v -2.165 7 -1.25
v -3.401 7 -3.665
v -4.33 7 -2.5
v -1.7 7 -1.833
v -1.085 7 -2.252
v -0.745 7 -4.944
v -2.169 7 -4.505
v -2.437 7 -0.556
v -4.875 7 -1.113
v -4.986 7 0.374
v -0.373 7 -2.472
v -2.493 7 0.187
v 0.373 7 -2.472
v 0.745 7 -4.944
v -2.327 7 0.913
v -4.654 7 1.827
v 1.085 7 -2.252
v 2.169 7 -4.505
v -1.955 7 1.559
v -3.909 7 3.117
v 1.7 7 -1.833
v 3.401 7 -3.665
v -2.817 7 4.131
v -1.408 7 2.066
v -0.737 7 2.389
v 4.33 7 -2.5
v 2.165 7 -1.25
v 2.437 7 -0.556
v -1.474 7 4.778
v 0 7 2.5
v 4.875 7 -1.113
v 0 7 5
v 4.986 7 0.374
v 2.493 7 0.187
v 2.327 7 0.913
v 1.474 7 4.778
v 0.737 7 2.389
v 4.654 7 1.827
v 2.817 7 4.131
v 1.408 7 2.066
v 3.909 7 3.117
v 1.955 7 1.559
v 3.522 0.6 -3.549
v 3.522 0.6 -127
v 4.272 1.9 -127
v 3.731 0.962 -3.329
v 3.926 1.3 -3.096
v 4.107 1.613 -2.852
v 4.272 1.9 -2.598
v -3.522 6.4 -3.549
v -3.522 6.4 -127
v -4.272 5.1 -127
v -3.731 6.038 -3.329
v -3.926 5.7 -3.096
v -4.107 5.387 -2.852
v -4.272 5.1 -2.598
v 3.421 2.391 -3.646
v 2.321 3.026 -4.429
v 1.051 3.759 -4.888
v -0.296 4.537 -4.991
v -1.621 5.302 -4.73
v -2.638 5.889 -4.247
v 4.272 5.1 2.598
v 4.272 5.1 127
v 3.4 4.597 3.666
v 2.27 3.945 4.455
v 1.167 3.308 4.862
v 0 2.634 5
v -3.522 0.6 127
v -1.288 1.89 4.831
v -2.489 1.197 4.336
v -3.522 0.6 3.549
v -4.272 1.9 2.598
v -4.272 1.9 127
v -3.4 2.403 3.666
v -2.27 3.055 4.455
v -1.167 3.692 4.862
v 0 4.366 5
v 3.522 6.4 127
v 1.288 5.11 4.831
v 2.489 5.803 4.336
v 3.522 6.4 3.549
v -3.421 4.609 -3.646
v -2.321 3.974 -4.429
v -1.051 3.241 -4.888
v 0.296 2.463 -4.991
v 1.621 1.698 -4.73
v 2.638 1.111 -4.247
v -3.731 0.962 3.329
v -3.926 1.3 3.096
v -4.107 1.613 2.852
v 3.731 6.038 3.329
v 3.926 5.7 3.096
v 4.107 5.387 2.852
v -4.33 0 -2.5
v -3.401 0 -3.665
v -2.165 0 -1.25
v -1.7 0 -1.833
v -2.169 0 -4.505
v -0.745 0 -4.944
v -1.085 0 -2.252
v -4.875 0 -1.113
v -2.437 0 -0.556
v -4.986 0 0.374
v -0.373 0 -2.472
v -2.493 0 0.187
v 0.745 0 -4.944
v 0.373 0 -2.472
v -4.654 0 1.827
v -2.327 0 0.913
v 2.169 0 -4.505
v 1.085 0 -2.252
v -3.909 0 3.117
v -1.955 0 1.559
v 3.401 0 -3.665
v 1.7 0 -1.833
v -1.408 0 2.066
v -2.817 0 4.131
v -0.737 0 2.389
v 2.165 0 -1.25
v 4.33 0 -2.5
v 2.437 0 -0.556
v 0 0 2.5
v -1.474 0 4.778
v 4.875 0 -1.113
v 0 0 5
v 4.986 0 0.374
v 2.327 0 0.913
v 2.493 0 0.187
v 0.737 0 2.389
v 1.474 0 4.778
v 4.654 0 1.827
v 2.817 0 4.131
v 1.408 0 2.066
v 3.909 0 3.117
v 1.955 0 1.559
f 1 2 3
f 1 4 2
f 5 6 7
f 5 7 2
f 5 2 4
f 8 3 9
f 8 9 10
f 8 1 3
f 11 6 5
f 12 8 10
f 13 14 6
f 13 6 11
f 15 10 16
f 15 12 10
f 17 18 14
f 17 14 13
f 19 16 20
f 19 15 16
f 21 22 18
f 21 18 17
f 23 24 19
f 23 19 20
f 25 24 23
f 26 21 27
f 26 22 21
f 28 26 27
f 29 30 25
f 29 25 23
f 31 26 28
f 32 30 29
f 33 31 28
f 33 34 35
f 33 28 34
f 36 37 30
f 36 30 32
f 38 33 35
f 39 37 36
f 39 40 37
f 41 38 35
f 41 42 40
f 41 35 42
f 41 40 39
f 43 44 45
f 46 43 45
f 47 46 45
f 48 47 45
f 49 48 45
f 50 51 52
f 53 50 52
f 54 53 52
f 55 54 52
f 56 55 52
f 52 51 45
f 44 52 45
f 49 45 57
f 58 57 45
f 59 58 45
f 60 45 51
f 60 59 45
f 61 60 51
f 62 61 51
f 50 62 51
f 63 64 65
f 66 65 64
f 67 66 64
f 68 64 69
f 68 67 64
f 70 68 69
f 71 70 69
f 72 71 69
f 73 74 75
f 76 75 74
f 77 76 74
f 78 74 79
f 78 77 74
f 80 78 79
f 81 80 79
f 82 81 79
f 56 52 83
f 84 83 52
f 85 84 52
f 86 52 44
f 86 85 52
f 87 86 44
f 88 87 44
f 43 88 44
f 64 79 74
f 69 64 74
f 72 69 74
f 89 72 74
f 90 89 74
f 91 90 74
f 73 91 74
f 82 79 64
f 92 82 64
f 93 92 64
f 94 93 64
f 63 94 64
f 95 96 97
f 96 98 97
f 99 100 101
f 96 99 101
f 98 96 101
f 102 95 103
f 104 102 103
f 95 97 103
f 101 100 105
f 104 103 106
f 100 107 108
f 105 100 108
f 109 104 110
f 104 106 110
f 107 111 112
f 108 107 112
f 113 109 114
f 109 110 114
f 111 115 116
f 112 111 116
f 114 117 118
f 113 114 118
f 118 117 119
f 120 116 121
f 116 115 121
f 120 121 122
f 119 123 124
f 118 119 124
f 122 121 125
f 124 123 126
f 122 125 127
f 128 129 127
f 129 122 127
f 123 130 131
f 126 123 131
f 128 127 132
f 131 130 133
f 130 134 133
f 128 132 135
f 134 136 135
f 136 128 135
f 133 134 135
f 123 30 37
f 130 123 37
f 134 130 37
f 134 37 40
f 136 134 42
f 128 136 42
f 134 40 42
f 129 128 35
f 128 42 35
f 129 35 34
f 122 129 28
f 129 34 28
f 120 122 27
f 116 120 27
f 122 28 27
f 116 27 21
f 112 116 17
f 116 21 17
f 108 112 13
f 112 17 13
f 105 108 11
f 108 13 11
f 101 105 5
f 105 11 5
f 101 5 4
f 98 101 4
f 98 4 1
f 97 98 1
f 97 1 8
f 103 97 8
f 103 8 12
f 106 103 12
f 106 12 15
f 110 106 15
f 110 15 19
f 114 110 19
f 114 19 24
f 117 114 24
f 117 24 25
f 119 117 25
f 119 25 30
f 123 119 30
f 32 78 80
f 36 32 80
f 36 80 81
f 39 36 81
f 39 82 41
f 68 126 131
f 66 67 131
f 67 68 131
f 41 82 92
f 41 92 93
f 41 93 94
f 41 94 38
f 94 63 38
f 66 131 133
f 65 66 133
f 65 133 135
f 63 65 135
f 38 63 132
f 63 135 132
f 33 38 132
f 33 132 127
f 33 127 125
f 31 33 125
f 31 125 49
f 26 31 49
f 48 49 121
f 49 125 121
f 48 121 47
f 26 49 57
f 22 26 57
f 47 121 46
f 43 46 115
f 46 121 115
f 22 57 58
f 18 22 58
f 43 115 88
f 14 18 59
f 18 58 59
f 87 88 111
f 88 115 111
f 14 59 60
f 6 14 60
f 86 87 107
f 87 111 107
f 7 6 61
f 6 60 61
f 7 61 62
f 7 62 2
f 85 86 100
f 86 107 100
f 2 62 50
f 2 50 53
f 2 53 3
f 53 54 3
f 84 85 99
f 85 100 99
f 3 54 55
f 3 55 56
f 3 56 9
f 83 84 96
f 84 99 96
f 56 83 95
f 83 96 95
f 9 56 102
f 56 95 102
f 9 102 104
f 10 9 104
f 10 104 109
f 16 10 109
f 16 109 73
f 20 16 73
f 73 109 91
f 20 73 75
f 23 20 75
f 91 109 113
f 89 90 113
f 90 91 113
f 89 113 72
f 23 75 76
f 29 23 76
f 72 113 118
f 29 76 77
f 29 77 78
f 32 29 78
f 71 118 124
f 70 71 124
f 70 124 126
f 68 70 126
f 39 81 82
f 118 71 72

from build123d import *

# Parameters (mm, degrees)
SKETCH_1_R               = 5
EXTRUDE_1_DEPTH          = 7
EXTRUDE_2_DEPTH          = 127
PATTERN_CIRCULAR_1_COUNT = 2
CUT_EXTRUDE_1_REACH      = 129.291
SKETCH_2_R               = 2.5


with BuildPart() as part:
    # 草图1 → 凸台-拉伸1 (new body)
    with BuildSketch(Plane(origin=(0, 0, 0), x_dir=(1, 0, 0), z_dir=(0, 1, 0))):
        with Locations(Location((0, 0, 0), (0, 0, 270))):
            Circle(SKETCH_1_R)
    extrude(amount=EXTRUDE_1_DEPTH)

    # 草图3 → 凸台-拉伸2 (add)
    with BuildSketch(Plane.XY):
        Polygon((-4.272114317, 1.899519053), (3.522114317, 6.399519053), (4.272114317, 5.100480947), (-3.522114317, 0.600480947), align=None)
    extrude_2 = extrude(amount=EXTRUDE_2_DEPTH)

    # 阵列(圆周)1: 凸台-拉伸2 ×2 about axis
    pattern_circular_1_axis = Axis((0, 0, 0), (0, 1, 0))
    for i in range(1, PATTERN_CIRCULAR_1_COUNT):
        add(extrude_2.rotate(pattern_circular_1_axis, i * 360 / PATTERN_CIRCULAR_1_COUNT))

    # 草图2 → 切除-拉伸1 (cut, up to next)
    with BuildSketch(Plane(origin=(0, 7, 0), x_dir=(1, 0, 0), z_dir=(0, 1, 0)), mode=Mode.PRIVATE) as cut_extrude_1_sk1:
        with Locations(Location((0, 0, 0), (0, 0, 270))):
            Circle(SKETCH_2_R)
    cut_extrude_1_tool1 = extrude(cut_extrude_1_sk1.sketch, amount=-CUT_EXTRUDE_1_REACH, mode=Mode.PRIVATE) & part.part
    add(cut_extrude_1_tool1.solids().sort_by_distance((0, 7, 0))[0], mode=Mode.SUBTRACT)


solid = part.part
